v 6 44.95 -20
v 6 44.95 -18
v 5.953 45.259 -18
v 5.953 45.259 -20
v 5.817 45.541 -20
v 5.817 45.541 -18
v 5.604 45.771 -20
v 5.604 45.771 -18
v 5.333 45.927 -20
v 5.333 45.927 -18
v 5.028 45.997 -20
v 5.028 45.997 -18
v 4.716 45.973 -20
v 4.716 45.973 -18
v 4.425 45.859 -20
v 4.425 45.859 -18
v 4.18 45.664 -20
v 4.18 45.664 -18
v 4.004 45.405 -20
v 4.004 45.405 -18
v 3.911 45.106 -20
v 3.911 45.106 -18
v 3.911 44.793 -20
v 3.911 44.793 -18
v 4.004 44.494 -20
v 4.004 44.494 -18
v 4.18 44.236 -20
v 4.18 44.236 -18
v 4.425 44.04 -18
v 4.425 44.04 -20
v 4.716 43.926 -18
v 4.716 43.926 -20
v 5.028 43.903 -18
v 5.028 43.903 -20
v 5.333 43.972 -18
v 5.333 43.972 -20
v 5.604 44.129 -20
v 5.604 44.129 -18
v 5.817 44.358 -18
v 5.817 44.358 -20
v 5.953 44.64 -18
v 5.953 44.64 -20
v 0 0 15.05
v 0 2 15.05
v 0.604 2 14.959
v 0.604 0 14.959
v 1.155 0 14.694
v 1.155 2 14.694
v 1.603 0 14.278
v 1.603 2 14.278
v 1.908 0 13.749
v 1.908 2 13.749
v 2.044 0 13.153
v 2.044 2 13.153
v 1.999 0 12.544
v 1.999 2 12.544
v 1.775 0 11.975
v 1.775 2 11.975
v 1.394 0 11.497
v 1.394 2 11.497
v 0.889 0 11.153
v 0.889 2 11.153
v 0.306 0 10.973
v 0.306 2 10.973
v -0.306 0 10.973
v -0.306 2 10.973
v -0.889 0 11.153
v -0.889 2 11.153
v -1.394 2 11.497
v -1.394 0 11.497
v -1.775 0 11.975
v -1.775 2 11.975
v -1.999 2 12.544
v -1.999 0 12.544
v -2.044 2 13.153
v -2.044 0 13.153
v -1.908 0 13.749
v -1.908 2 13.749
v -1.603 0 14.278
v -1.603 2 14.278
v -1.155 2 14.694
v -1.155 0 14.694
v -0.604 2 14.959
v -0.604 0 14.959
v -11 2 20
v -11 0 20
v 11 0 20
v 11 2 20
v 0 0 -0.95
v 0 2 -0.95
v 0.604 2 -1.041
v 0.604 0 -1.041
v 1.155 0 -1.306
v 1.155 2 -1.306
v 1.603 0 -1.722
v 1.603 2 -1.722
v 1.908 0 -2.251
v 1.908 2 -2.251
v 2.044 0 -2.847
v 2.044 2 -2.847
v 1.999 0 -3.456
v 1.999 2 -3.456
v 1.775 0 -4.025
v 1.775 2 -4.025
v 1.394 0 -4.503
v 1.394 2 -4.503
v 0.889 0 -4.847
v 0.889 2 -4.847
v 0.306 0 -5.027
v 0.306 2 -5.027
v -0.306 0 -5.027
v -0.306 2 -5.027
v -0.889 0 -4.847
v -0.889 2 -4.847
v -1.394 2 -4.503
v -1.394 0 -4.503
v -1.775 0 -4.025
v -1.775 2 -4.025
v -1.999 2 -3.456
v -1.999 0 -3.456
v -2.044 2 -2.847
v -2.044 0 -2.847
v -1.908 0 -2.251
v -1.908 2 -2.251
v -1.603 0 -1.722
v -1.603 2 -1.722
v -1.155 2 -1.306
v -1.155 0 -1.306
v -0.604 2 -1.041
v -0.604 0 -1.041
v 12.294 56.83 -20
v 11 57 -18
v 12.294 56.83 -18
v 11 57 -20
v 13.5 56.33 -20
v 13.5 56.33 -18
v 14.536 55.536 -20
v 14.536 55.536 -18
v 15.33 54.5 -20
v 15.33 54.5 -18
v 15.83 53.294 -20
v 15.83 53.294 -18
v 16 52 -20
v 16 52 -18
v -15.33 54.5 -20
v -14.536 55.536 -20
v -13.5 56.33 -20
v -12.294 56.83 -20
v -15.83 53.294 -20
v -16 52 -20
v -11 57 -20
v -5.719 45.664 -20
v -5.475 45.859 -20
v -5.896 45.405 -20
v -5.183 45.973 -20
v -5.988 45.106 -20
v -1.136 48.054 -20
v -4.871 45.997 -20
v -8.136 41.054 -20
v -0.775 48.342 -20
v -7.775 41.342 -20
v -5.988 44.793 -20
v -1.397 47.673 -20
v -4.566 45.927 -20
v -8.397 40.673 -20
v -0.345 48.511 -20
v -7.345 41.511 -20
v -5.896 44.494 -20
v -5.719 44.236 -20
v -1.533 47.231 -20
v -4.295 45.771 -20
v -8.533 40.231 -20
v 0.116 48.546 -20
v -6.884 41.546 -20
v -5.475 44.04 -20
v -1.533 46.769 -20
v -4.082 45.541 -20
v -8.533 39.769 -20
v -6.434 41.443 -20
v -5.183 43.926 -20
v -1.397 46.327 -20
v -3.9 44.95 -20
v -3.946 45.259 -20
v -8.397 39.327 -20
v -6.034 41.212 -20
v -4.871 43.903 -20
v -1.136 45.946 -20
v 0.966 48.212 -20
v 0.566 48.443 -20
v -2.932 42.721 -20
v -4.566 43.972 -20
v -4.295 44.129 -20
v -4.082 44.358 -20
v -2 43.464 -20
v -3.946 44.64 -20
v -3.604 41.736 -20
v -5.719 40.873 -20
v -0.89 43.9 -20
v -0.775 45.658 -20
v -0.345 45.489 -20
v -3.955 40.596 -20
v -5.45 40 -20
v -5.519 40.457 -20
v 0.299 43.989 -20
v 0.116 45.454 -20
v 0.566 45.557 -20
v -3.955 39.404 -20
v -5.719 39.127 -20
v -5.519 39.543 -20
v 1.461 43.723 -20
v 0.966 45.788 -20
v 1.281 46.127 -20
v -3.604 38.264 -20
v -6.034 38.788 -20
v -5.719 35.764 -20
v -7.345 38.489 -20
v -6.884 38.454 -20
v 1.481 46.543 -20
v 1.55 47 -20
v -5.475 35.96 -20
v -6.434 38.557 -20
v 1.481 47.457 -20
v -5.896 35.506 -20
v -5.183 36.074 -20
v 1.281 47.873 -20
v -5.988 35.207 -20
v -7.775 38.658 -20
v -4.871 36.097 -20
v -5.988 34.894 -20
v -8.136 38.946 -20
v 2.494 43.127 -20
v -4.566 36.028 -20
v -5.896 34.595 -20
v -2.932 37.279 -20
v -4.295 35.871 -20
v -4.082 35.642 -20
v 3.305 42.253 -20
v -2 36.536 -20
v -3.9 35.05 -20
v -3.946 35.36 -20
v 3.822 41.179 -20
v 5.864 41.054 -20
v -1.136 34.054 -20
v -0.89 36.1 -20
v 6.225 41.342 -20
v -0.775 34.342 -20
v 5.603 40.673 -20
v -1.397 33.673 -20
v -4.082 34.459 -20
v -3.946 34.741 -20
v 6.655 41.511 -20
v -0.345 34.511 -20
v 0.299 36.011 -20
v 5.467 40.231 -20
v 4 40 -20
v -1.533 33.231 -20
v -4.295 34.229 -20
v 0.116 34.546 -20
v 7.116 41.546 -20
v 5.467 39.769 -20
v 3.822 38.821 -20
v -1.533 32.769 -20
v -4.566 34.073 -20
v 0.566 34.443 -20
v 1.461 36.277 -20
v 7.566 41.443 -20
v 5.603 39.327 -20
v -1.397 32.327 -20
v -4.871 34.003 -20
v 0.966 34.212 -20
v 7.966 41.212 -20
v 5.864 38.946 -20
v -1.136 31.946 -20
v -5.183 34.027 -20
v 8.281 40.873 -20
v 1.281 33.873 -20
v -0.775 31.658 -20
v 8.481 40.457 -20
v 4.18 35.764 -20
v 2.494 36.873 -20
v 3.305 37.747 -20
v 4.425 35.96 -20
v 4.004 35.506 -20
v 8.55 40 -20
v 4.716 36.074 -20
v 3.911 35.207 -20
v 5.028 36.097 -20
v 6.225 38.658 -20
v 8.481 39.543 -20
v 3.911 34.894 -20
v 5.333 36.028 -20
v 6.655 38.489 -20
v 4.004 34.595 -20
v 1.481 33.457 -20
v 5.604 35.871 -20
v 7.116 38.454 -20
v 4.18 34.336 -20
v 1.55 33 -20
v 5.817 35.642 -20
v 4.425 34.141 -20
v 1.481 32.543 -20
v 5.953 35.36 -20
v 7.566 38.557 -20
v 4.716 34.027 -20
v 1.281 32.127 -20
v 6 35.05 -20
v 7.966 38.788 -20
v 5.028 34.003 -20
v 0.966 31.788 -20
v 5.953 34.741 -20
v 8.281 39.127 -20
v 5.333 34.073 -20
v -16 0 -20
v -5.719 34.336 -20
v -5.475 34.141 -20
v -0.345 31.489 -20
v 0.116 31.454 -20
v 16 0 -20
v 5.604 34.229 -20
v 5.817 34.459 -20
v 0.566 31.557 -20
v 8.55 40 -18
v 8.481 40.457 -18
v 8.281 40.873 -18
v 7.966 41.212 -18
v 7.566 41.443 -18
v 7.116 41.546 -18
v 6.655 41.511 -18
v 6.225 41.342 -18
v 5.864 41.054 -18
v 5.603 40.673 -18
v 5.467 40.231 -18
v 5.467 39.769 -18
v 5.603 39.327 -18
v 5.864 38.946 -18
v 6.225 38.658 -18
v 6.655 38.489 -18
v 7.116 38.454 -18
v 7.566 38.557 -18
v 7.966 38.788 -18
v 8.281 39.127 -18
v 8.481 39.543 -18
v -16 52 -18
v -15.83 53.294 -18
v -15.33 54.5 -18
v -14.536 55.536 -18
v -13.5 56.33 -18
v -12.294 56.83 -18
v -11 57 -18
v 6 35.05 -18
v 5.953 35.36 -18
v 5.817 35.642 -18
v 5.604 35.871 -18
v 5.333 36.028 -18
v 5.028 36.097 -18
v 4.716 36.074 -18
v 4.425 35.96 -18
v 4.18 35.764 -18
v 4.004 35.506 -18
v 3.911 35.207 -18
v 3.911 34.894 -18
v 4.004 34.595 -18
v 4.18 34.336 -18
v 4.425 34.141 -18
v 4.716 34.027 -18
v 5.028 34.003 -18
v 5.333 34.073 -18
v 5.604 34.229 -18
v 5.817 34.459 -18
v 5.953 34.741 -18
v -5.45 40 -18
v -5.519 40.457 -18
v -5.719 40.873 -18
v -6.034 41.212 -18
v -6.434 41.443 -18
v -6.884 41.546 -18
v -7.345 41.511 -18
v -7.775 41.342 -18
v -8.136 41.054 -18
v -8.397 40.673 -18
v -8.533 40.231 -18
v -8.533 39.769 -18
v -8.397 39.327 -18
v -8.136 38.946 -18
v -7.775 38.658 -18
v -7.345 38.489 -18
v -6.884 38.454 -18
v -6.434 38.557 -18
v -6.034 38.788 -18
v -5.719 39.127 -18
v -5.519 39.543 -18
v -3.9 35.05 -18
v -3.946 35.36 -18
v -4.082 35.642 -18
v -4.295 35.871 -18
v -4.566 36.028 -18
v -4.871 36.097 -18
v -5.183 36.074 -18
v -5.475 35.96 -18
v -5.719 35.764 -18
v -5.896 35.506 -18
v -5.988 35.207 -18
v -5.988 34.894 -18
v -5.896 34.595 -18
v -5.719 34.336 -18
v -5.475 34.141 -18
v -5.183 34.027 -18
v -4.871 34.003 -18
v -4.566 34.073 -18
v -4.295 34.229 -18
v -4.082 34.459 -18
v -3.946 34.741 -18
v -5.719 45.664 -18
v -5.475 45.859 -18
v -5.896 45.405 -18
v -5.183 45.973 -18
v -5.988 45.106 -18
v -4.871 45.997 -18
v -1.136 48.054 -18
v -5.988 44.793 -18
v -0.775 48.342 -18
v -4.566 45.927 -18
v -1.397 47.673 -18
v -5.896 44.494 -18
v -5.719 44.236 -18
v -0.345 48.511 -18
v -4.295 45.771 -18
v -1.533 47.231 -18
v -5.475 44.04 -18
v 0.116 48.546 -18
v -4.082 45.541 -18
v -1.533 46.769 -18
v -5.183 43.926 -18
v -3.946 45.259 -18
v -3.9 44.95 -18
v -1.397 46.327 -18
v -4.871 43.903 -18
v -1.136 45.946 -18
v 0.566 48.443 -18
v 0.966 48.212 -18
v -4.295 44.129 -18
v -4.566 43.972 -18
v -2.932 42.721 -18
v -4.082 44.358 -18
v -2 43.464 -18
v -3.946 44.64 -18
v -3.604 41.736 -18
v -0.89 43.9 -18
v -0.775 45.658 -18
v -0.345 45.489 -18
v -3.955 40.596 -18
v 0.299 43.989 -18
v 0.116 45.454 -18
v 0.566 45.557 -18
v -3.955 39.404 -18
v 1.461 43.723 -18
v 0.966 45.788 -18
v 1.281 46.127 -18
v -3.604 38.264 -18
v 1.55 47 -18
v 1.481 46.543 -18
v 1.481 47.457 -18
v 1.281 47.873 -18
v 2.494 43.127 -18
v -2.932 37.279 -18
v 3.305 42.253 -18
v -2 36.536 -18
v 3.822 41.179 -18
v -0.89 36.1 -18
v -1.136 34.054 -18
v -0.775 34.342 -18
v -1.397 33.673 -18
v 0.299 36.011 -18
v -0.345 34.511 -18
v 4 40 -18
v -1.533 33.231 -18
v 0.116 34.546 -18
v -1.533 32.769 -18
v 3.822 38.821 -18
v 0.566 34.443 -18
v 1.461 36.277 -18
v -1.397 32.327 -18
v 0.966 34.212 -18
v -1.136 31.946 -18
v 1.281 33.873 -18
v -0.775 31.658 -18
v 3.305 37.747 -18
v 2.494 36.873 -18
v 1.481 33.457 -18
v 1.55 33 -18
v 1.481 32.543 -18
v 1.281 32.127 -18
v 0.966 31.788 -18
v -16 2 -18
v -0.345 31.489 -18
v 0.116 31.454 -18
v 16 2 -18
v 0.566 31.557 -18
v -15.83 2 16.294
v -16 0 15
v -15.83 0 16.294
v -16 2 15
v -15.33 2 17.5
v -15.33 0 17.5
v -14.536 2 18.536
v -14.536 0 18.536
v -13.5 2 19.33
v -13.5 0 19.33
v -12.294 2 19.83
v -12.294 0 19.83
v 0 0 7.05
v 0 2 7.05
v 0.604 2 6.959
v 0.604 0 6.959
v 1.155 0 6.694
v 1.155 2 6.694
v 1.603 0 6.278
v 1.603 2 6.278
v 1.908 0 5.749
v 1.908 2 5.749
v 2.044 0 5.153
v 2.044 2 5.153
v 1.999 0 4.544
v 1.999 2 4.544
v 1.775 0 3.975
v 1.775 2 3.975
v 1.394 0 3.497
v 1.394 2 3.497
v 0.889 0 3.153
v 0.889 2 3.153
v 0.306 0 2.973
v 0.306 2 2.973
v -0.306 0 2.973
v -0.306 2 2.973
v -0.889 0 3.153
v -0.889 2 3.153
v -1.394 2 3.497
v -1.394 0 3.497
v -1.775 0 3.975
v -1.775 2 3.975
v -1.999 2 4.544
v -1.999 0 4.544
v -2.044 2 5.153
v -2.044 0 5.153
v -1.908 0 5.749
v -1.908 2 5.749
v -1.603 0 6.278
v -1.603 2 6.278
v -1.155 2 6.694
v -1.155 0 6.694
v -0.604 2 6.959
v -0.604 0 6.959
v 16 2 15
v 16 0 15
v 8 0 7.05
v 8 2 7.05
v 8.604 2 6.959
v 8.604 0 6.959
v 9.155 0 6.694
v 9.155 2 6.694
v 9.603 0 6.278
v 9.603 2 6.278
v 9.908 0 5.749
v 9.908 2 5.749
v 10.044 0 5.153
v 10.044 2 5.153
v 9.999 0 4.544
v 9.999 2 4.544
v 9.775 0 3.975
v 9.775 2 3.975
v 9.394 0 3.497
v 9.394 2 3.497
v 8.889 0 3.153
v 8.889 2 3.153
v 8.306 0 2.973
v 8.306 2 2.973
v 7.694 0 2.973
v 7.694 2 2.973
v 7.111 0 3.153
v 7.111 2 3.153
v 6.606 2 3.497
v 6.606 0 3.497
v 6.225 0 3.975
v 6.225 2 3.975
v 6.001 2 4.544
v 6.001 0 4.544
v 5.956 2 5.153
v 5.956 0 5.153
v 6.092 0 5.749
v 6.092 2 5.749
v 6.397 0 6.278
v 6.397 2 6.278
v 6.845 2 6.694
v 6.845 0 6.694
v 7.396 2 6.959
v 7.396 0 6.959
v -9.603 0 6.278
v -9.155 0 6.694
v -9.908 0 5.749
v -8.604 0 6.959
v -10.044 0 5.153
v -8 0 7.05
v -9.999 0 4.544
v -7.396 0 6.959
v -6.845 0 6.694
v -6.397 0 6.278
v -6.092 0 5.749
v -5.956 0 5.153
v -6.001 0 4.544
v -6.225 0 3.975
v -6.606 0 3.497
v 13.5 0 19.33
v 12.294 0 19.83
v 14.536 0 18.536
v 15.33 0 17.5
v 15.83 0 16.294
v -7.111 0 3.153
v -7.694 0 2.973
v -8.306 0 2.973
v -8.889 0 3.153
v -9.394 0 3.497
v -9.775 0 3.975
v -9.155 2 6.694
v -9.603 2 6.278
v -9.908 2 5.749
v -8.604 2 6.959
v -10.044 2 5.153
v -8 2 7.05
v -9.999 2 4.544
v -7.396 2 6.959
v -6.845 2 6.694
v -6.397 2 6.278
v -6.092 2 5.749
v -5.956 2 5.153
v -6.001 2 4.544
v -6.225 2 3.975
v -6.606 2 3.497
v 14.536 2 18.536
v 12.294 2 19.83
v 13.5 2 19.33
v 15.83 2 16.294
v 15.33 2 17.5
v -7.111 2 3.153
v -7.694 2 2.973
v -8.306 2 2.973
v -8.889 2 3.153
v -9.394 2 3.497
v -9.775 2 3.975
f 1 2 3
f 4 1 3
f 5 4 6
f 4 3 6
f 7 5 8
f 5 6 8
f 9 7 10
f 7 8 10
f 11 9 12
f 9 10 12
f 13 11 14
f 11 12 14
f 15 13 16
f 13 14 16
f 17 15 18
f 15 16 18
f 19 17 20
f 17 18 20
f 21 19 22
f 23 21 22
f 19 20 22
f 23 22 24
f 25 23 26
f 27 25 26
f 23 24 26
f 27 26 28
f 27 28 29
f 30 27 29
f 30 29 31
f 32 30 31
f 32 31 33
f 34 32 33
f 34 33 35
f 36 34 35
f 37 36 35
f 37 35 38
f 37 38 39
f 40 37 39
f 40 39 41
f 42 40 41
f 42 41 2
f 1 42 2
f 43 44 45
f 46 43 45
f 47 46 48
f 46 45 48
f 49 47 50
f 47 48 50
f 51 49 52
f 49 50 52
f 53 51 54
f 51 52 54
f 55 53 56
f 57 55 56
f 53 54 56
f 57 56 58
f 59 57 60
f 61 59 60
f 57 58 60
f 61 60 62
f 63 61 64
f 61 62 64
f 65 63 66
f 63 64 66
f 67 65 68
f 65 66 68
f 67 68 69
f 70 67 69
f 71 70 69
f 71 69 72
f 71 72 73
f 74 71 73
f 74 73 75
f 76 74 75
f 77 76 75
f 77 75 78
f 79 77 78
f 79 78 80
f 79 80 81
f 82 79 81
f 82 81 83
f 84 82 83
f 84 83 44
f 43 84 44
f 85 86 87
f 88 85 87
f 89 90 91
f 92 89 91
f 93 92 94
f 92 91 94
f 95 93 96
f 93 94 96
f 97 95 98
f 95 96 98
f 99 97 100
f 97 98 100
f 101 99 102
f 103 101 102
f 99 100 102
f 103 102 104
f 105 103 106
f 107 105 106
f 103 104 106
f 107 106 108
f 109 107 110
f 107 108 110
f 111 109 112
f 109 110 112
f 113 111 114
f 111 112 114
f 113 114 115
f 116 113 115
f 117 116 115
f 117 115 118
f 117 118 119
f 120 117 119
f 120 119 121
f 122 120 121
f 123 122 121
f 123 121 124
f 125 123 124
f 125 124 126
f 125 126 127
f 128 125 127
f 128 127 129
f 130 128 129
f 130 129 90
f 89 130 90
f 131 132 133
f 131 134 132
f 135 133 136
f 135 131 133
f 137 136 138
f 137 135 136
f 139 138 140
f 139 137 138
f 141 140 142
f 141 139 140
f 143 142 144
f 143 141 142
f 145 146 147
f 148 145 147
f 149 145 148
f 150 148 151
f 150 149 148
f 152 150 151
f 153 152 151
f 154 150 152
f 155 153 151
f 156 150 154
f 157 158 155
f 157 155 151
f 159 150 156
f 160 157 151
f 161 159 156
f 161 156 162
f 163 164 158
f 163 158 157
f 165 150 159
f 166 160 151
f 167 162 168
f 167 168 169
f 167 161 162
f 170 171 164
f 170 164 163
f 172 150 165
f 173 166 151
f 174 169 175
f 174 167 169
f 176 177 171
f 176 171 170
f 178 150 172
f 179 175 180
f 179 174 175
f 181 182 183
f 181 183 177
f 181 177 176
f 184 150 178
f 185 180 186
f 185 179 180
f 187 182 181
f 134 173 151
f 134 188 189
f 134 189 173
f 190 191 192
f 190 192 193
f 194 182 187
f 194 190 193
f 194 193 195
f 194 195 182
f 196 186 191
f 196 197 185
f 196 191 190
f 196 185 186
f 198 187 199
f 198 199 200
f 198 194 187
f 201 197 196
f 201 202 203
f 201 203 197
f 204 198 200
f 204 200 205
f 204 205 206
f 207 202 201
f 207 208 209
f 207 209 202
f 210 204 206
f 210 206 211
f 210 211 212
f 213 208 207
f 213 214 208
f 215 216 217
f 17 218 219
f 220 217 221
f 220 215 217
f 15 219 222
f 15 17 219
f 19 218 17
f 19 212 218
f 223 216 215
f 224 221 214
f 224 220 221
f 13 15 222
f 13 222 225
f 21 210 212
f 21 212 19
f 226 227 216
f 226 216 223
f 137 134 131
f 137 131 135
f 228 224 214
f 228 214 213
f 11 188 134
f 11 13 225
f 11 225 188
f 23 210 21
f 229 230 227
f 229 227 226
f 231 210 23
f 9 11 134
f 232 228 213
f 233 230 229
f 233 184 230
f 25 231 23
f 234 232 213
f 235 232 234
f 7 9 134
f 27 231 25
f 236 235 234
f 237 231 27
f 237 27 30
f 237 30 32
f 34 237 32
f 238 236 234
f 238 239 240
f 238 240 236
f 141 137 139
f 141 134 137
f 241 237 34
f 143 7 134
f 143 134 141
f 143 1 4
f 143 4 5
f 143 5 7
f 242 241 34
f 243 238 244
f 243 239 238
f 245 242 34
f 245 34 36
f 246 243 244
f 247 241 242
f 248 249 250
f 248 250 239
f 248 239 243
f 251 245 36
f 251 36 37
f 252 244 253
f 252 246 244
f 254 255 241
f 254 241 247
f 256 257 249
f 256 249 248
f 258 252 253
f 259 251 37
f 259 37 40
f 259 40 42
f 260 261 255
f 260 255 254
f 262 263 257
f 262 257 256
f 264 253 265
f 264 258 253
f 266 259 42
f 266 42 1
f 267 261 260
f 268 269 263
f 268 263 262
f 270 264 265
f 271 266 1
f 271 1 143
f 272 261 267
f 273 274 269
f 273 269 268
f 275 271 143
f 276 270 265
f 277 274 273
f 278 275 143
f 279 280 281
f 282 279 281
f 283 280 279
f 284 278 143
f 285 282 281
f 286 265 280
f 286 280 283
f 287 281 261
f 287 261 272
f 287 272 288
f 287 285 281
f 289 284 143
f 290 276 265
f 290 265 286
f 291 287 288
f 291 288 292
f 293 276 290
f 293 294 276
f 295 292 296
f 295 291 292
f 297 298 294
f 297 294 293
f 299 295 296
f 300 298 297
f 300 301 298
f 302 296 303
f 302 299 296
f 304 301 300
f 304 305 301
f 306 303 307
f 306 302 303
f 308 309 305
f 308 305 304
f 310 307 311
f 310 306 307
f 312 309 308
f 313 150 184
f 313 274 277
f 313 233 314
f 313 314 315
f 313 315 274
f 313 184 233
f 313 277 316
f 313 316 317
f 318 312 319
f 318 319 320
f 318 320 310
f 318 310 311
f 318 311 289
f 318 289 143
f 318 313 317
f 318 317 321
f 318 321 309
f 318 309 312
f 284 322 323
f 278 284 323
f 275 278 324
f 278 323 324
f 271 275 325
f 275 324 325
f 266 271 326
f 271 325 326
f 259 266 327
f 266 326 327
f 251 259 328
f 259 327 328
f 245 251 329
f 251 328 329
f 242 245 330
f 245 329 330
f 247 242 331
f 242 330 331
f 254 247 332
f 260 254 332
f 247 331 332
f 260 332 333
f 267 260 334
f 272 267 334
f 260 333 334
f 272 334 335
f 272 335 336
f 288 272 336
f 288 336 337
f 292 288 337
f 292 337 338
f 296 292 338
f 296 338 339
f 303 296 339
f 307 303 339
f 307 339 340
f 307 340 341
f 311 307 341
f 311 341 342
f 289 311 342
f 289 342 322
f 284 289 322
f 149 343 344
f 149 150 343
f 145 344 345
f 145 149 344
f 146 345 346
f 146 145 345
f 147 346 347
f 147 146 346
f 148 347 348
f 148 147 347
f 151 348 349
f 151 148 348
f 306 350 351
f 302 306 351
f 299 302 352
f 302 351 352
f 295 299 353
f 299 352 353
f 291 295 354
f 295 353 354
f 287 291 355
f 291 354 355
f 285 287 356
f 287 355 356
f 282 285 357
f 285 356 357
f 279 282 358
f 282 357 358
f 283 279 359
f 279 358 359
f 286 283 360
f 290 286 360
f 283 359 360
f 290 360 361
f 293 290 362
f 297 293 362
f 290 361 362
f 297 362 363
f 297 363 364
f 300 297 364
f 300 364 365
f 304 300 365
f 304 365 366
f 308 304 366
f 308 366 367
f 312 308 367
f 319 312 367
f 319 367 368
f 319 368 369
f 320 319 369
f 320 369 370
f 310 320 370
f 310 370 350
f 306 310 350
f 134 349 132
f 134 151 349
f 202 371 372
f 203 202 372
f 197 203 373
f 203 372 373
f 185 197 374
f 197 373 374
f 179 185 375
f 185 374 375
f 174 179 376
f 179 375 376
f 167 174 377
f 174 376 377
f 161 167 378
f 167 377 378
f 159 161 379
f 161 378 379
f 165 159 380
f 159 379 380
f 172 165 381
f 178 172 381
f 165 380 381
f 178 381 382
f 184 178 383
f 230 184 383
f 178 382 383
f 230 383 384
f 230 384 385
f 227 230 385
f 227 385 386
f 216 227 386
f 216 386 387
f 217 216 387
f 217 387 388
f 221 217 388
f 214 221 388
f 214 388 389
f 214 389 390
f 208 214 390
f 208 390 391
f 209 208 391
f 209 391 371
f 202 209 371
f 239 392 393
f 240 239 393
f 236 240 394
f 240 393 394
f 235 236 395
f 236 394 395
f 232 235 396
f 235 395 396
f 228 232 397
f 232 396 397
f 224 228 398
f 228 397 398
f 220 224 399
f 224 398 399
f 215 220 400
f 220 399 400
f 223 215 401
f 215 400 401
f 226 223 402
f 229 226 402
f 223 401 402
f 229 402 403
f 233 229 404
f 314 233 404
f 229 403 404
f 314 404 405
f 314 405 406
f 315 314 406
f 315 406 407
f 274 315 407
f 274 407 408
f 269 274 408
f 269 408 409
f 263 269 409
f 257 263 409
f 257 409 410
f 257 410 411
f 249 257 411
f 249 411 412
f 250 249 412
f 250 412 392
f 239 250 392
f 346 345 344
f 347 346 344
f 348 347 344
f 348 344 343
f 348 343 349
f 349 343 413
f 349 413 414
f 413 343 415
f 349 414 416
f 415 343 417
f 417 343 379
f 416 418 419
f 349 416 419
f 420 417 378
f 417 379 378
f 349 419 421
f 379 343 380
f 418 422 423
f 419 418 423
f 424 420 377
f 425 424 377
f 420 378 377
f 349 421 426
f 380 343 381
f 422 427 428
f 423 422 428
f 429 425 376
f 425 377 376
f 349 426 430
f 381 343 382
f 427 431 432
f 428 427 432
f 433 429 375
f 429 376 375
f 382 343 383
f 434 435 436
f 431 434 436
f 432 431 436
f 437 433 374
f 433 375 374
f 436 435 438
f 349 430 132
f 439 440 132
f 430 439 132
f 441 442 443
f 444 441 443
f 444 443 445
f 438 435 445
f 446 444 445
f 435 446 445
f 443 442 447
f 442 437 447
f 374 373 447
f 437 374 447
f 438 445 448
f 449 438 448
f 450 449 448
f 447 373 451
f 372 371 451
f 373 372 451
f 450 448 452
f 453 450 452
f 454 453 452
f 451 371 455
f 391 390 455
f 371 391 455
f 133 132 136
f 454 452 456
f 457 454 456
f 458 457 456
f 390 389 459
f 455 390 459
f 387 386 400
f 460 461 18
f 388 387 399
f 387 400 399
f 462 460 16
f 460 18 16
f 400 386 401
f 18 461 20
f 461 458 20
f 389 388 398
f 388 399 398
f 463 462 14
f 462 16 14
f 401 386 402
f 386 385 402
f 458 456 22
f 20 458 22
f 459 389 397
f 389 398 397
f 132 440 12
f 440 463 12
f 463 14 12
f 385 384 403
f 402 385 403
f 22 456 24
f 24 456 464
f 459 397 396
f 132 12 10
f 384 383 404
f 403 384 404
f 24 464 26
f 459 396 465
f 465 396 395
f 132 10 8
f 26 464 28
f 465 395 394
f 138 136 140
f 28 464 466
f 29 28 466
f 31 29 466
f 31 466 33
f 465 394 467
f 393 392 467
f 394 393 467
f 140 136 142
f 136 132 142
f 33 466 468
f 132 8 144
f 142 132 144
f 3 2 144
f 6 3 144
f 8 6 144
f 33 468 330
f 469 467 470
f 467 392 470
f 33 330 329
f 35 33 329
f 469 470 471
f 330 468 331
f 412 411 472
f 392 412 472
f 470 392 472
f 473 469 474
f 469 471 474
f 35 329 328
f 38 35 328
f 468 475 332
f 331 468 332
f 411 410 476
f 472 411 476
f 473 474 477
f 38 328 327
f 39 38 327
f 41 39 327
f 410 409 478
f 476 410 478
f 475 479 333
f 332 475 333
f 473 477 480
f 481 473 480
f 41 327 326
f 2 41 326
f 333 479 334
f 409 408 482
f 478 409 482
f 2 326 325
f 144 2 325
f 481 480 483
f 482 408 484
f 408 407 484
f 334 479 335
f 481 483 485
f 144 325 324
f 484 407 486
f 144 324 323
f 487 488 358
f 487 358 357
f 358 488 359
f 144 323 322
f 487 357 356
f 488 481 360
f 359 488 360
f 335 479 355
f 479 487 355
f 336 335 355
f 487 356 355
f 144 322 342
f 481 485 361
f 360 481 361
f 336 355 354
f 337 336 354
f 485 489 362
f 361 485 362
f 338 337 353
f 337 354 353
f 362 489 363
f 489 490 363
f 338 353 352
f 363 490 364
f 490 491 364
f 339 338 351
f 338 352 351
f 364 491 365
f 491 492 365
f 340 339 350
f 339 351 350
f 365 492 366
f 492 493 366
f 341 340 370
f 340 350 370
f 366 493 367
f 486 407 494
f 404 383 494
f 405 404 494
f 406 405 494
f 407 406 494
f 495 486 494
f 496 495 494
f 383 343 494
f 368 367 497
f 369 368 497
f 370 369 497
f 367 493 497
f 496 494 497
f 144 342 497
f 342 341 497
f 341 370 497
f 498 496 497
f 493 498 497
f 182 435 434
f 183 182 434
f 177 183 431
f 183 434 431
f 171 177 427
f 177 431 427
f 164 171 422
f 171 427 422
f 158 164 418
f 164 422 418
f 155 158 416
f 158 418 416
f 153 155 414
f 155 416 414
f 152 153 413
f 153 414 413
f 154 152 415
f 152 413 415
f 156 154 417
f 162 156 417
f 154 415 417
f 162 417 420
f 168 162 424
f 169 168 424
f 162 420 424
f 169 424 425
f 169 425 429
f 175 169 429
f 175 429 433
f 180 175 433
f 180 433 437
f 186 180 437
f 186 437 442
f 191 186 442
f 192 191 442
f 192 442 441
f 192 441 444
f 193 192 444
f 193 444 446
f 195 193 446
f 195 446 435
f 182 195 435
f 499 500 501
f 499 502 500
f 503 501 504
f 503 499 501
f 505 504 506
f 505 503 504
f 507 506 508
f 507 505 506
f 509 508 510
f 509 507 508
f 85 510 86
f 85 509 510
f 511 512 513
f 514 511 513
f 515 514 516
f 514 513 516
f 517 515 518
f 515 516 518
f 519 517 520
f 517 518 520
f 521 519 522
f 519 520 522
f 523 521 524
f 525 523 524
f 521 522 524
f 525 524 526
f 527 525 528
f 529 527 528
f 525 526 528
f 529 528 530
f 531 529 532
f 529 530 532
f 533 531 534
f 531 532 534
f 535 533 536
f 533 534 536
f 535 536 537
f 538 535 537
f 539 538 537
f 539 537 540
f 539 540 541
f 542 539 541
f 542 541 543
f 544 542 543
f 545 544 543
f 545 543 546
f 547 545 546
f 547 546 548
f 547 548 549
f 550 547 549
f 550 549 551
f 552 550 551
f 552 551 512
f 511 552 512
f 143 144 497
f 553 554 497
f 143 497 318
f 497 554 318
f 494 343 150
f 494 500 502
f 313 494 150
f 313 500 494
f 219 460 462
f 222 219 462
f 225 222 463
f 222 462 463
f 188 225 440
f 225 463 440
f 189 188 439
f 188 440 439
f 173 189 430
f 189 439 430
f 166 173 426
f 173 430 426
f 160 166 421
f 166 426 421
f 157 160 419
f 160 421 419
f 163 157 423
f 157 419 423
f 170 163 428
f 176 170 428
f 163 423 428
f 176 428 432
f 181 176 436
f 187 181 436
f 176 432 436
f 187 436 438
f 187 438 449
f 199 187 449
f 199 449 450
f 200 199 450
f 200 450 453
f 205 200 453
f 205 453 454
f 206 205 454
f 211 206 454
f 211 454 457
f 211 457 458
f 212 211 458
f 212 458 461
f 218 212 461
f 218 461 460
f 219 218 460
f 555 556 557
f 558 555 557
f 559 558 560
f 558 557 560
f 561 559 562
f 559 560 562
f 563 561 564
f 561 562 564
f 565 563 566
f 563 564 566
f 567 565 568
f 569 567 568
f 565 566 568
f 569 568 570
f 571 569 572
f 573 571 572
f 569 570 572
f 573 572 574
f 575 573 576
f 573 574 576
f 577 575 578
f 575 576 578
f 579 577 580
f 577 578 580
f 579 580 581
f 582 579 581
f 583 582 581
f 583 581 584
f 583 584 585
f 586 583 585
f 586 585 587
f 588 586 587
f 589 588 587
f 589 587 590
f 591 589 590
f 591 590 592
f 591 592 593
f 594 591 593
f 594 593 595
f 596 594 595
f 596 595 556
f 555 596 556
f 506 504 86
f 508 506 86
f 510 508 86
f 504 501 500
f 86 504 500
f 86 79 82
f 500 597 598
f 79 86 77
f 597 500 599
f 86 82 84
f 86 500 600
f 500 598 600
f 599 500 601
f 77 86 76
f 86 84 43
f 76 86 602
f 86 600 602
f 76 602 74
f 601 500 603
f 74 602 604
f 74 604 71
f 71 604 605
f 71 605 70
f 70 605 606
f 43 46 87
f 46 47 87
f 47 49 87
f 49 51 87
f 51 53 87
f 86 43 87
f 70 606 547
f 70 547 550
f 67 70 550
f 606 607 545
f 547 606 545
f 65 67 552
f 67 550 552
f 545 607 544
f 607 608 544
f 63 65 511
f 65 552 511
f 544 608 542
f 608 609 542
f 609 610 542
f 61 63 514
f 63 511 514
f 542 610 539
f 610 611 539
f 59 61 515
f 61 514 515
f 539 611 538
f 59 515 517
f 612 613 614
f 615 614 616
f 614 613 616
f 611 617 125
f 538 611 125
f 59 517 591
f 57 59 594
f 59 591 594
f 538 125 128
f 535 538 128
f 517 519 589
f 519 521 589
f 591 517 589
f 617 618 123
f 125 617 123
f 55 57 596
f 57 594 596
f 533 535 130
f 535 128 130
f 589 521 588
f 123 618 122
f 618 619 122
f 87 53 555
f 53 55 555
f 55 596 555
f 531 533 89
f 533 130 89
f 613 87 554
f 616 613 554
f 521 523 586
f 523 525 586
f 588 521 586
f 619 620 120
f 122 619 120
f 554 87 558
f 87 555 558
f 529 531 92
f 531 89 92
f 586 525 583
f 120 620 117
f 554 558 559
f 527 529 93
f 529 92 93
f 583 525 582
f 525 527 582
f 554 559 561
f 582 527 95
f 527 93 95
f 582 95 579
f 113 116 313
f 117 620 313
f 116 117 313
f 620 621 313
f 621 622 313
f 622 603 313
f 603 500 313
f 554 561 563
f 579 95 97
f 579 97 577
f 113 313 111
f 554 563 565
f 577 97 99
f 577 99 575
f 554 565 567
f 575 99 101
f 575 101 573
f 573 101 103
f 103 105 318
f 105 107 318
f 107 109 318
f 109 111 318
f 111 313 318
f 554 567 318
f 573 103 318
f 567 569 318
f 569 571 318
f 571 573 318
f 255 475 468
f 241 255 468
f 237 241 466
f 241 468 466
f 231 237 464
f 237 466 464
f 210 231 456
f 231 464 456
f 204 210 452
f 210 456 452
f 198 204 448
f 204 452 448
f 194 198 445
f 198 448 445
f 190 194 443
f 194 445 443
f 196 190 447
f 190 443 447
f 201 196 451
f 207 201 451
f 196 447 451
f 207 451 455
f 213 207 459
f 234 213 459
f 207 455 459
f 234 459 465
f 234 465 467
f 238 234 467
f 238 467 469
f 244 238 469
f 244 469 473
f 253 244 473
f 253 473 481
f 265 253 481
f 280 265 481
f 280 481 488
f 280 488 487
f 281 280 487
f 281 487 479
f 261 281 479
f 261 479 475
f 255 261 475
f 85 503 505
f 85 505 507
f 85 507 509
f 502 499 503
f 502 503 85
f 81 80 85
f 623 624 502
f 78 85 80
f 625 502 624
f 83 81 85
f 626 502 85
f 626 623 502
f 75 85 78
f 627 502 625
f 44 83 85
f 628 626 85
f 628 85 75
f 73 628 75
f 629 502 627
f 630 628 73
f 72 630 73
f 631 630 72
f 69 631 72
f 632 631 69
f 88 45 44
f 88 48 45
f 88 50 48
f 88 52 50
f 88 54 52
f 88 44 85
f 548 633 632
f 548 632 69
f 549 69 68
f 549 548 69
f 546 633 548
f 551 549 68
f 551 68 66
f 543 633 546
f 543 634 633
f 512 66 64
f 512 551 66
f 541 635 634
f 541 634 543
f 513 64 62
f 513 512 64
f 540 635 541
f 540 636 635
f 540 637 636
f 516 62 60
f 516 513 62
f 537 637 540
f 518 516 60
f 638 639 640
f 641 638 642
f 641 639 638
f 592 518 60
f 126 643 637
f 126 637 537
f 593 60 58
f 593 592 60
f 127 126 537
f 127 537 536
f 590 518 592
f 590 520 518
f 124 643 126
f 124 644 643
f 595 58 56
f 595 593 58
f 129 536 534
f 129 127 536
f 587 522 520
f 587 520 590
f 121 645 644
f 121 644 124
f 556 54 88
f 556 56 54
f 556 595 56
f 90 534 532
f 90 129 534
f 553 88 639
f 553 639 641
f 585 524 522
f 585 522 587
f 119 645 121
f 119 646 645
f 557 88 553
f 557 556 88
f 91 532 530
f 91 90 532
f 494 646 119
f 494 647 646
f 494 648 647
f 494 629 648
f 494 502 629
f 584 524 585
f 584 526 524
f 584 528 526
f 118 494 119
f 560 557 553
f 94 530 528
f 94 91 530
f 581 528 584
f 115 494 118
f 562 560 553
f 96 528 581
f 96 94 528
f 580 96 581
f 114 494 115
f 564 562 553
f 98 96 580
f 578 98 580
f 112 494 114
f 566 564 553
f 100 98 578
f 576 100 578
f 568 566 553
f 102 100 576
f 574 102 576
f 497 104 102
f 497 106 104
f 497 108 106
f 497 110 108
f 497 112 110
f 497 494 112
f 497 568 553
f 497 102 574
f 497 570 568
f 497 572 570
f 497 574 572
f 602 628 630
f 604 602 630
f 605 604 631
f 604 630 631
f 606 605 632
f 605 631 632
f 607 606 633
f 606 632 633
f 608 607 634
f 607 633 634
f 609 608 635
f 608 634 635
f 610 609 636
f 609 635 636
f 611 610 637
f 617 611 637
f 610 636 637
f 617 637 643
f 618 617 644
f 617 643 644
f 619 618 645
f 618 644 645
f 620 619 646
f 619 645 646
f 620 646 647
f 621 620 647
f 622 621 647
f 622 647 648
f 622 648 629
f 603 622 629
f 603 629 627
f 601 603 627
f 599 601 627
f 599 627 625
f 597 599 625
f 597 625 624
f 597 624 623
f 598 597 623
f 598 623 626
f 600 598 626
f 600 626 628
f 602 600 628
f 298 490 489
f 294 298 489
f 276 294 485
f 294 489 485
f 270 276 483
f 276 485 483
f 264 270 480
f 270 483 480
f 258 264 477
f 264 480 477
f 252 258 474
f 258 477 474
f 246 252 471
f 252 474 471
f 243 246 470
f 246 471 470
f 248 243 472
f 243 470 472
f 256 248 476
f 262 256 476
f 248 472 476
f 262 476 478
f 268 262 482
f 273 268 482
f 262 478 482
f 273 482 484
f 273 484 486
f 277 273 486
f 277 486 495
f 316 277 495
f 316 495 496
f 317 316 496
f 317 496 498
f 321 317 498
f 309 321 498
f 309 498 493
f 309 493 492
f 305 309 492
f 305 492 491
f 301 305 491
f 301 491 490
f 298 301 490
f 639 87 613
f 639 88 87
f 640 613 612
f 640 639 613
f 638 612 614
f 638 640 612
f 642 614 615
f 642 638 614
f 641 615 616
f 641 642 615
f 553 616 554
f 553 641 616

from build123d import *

# Parameters (mm, degrees)
SKETCH_2_W          = 32
SKETCH_2_H          = 40
EXTRUDE_1_DEPTH     = 2
SKETCH_3_W          = 32
SKETCH_3_H          = 2
EXTRUDE_2_DEPTH     = 55
SKETCH_6_R          = 2.05
CUT_EXTRUDE_2_DEPTH = 61.671245248
FILLET_1_R          = 5
SKETCH1_R           = 4
SKETCH1_R_2         = 1.55
SKETCH1_R_3         = 1.05
CUT_EXTRUDE1_DEPTH  = 10


with BuildPart() as part:
    # 草图2 → 凸台-拉伸1 (new body)
    with BuildSketch(Plane(origin=(0, 0, 0), x_dir=(1, 0, 0), z_dir=(0, 1, 0))):
        Rectangle(SKETCH_2_W, SKETCH_2_H)
    extrude(amount=EXTRUDE_1_DEPTH)

    # 草图3 → 凸台-拉伸2 (add)
    with BuildSketch(Plane(origin=(0, 2, 0), x_dir=(1, 0, 0), z_dir=(0, 1, 0))):
        with Locations((0, 19)):
            Rectangle(SKETCH_3_W, SKETCH_3_H)
    extrude(amount=EXTRUDE_2_DEPTH)

    # 草图6 → 切除-拉伸2 (cut, through all)
    with BuildSketch(Plane(origin=(0, 2, 0), x_dir=(1, 0, 0), z_dir=(0, 1, 0))):
        with Locations(Location((0, -5, 0), (0, 0, 270))):
            Circle(SKETCH_6_R)
        with Locations(Location((-8, -5, 0), (0, 0, 270))):
            Circle(SKETCH_6_R)
        with Locations(Location((8, -5, 0), (0, 0, 270))):
            Circle(SKETCH_6_R)
        with Locations(Location((0, 3, 0), (0, 0, 270))):
            Circle(SKETCH_6_R)
        with Locations(Location((0, -13, 0), (0, 0, 270))):
            Circle(SKETCH_6_R)
    extrude(amount=-CUT_EXTRUDE_2_DEPTH, mode=Mode.SUBTRACT)

    # 圆角1
    fillet_1_edges = [part.edges().sort_by_distance(p)[0] for p in [
        (-16, 57, -19),
        (16, 57, -19),
        (16, 1, 20),
        (-16, 1, 20),
    ]]
    fillet(fillet_1_edges, radius=FILLET_1_R)

    # Sketch1 → Cut-Extrude1 (cut)
    with BuildSketch(Plane.XY.offset(-18)):
        with Locations((0, 40)):
            Circle(SKETCH1_R)
        with Locations((0, 47)):
            Circle(SKETCH1_R_2)
        with Locations((4.949747468, 44.949747468)):
            Circle(SKETCH1_R_3)
        with Locations((7, 40)):
            Circle(SKETCH1_R_2)
        with Locations((4.949747468, 35.050252532)):
            Circle(SKETCH1_R_3)
        with Locations((0, 33)):
            Circle(SKETCH1_R_2)
        with Locations((-4.949747468, 35.050252532)):
            Circle(SKETCH1_R_3)
        with Locations((-4.949747468, 44.949747468)):
            Circle(SKETCH1_R_3)
        with Locations((-7, 40)):
            Circle(SKETCH1_R_2)
    extrude(amount=-CUT_EXTRUDE1_DEPTH, mode=Mode.SUBTRACT)


solid = part.part
